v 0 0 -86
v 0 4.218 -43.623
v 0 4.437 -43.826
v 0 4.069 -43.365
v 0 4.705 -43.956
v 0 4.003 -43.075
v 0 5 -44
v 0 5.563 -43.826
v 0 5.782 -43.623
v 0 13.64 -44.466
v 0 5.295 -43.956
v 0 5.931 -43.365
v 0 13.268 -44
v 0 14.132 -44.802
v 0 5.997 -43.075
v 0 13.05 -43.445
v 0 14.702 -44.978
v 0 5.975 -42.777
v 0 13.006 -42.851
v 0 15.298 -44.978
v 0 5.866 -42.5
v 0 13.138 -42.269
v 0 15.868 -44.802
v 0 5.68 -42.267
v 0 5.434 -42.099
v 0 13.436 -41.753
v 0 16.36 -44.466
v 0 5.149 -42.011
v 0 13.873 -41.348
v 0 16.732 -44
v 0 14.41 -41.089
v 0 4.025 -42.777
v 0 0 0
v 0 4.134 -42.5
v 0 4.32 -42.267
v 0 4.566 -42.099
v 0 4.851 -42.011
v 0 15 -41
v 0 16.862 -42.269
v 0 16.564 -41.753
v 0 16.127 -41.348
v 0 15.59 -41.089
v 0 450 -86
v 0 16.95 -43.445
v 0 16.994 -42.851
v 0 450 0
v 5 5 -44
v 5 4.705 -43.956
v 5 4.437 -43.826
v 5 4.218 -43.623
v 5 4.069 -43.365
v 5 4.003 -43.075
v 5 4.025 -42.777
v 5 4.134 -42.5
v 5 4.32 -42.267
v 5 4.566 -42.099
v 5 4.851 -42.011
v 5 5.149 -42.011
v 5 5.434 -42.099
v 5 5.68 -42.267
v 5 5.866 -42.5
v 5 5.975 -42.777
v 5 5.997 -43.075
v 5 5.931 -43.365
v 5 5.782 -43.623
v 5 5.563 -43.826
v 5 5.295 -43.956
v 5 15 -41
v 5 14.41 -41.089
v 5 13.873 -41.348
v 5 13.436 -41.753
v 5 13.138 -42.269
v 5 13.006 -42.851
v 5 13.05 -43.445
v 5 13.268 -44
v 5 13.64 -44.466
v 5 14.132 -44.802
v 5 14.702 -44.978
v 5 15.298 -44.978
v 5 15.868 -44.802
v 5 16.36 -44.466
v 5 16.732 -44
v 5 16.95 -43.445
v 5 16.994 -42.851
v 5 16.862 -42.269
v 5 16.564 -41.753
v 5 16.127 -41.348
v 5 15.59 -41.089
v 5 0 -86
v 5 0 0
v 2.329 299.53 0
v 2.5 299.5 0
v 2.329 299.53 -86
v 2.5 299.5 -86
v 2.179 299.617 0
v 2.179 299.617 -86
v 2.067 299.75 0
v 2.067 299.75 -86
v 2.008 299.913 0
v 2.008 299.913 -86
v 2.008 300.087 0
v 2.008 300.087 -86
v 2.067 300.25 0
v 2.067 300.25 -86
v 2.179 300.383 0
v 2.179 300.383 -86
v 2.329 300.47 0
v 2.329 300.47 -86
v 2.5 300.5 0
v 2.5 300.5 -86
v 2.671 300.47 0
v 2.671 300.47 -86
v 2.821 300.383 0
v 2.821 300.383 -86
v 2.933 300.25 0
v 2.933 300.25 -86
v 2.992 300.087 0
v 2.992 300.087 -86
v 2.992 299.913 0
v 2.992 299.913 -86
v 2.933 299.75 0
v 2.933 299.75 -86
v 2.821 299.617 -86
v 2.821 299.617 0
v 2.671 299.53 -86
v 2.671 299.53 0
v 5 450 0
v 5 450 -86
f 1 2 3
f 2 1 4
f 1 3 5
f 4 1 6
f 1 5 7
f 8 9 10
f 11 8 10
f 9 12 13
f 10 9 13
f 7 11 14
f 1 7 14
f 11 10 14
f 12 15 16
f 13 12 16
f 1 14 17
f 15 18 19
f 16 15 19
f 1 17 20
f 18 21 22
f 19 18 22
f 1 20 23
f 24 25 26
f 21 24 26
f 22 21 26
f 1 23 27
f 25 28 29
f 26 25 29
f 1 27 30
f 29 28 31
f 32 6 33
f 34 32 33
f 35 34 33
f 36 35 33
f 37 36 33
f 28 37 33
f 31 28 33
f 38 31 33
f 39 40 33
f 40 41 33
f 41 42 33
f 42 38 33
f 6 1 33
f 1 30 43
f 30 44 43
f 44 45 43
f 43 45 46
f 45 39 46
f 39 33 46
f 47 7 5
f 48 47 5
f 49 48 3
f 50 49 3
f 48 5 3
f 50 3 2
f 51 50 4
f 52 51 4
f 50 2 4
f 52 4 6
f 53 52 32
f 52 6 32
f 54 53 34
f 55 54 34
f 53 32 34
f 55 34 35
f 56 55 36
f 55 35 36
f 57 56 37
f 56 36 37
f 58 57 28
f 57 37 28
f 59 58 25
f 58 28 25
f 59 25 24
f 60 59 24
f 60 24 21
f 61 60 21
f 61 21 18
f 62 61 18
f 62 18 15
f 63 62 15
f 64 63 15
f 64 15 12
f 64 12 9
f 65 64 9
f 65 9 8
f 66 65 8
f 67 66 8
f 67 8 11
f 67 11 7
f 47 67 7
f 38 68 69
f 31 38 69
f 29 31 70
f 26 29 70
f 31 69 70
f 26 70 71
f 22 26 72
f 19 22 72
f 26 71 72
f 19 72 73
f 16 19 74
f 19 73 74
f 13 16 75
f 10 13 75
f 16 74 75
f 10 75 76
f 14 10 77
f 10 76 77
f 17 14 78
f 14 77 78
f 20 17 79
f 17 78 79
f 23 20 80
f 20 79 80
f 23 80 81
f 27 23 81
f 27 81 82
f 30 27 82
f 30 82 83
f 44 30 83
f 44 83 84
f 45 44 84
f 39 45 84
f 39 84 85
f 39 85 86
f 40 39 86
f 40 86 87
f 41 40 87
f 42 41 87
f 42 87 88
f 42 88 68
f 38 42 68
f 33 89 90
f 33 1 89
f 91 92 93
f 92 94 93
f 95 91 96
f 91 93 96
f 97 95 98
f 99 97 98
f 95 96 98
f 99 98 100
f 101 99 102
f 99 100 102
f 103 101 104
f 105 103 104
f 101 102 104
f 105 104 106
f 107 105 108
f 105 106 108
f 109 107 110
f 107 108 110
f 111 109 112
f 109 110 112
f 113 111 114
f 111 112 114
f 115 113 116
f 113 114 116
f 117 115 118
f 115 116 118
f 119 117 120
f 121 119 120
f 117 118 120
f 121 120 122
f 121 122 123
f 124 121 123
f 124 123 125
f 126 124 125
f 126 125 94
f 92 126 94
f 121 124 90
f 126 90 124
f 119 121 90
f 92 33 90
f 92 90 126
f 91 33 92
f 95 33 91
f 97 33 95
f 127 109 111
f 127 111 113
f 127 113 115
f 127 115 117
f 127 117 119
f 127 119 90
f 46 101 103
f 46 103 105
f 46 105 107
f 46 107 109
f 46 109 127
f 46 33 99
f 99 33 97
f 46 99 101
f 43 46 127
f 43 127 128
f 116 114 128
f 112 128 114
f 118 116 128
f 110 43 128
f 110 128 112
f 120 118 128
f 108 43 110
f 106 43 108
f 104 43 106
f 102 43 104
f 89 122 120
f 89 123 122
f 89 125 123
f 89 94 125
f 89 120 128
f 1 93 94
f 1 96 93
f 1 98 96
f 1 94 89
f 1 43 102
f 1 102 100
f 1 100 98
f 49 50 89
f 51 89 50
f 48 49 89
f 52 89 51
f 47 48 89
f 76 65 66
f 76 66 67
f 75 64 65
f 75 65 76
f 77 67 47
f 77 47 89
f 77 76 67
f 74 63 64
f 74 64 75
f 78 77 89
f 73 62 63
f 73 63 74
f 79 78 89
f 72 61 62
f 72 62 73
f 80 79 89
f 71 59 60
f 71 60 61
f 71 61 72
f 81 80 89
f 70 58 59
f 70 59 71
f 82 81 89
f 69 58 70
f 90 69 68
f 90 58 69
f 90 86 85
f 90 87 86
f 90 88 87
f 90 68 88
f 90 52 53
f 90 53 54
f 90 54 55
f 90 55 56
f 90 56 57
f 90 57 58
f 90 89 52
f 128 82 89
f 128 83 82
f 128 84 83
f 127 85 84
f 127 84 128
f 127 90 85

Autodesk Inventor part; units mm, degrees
ref_plane "YZ Plane" through (0, 0, 0) normal (1, 0, 0) x (0, 1, 0)
ref_plane "XZ Plane" through (0, 0, 0) normal (0, 1, 0) x (-1, 0, 0)
ref_plane "XY Plane" through (0, 0, 0) normal (0, 0, 1) x (1, 0, 0)
sketch "Sketch1" plane through (0, 0, 0) normal (1, 0, 0) x (0, 1, 0)
  line L0 (0, 0) -> (450, 0)
  line L1 (450, 0) -> (450, -86)
  line L2 (450, -86) -> (0, -86)
  line L3 (0, -86) -> (0, 0)
  dimension "d0" = 450
  dimension "d1" = 86
extrude "Extrusion1" add sketch "Sketch1" along normal blind 5
sketch "Sketch2" plane through (5, 0, 0) normal (1, 0, 0) x (0, 0, -1)
  line L0 (0, 0) -> (86, 0) projected
  line L1 (0, 450) -> (0, 0) projected
  point P0 (43, 5)
  dimension "d4" = 5
  dimension "d5" = 43
hole "Hole1" at (5, 5, -43) direction (-1, 0, 0) diameter 2 end through all
sketch "Sketch3" plane through (0, 0, 0) normal (0, 0, 1) x (1, 0, 0)
  line L0 (0, 450) -> (5, 450) projected
  line L1 (5, 450) -> (5, 0) projected
  point P0 (0, 0)
  point P1 (2.5, 300)
  dimension "d13" = 150
  dimension "d14" = 2.5
hole "Hole2" at (2.5, 300, 0) direction (0, 0, -1) diameter 1 end through all
sketch "Sketch4" plane through (0, 0, 0) normal (-1, 0, 0) x (0, 0, 1)
  line L0 (0, 0) -> (-86, 0) projected
  line L1 (0, 450) -> (0, 0) projected
  point P0 (-43, 15)
  dimension "d22" = 15
  dimension "d23" = 43
hole "Hole3" at (0, 15, -43) direction (1, 0, 0) diameter 4 end through all
properties part number "support_seed_holder" material "Polystyrene, Expanded"
